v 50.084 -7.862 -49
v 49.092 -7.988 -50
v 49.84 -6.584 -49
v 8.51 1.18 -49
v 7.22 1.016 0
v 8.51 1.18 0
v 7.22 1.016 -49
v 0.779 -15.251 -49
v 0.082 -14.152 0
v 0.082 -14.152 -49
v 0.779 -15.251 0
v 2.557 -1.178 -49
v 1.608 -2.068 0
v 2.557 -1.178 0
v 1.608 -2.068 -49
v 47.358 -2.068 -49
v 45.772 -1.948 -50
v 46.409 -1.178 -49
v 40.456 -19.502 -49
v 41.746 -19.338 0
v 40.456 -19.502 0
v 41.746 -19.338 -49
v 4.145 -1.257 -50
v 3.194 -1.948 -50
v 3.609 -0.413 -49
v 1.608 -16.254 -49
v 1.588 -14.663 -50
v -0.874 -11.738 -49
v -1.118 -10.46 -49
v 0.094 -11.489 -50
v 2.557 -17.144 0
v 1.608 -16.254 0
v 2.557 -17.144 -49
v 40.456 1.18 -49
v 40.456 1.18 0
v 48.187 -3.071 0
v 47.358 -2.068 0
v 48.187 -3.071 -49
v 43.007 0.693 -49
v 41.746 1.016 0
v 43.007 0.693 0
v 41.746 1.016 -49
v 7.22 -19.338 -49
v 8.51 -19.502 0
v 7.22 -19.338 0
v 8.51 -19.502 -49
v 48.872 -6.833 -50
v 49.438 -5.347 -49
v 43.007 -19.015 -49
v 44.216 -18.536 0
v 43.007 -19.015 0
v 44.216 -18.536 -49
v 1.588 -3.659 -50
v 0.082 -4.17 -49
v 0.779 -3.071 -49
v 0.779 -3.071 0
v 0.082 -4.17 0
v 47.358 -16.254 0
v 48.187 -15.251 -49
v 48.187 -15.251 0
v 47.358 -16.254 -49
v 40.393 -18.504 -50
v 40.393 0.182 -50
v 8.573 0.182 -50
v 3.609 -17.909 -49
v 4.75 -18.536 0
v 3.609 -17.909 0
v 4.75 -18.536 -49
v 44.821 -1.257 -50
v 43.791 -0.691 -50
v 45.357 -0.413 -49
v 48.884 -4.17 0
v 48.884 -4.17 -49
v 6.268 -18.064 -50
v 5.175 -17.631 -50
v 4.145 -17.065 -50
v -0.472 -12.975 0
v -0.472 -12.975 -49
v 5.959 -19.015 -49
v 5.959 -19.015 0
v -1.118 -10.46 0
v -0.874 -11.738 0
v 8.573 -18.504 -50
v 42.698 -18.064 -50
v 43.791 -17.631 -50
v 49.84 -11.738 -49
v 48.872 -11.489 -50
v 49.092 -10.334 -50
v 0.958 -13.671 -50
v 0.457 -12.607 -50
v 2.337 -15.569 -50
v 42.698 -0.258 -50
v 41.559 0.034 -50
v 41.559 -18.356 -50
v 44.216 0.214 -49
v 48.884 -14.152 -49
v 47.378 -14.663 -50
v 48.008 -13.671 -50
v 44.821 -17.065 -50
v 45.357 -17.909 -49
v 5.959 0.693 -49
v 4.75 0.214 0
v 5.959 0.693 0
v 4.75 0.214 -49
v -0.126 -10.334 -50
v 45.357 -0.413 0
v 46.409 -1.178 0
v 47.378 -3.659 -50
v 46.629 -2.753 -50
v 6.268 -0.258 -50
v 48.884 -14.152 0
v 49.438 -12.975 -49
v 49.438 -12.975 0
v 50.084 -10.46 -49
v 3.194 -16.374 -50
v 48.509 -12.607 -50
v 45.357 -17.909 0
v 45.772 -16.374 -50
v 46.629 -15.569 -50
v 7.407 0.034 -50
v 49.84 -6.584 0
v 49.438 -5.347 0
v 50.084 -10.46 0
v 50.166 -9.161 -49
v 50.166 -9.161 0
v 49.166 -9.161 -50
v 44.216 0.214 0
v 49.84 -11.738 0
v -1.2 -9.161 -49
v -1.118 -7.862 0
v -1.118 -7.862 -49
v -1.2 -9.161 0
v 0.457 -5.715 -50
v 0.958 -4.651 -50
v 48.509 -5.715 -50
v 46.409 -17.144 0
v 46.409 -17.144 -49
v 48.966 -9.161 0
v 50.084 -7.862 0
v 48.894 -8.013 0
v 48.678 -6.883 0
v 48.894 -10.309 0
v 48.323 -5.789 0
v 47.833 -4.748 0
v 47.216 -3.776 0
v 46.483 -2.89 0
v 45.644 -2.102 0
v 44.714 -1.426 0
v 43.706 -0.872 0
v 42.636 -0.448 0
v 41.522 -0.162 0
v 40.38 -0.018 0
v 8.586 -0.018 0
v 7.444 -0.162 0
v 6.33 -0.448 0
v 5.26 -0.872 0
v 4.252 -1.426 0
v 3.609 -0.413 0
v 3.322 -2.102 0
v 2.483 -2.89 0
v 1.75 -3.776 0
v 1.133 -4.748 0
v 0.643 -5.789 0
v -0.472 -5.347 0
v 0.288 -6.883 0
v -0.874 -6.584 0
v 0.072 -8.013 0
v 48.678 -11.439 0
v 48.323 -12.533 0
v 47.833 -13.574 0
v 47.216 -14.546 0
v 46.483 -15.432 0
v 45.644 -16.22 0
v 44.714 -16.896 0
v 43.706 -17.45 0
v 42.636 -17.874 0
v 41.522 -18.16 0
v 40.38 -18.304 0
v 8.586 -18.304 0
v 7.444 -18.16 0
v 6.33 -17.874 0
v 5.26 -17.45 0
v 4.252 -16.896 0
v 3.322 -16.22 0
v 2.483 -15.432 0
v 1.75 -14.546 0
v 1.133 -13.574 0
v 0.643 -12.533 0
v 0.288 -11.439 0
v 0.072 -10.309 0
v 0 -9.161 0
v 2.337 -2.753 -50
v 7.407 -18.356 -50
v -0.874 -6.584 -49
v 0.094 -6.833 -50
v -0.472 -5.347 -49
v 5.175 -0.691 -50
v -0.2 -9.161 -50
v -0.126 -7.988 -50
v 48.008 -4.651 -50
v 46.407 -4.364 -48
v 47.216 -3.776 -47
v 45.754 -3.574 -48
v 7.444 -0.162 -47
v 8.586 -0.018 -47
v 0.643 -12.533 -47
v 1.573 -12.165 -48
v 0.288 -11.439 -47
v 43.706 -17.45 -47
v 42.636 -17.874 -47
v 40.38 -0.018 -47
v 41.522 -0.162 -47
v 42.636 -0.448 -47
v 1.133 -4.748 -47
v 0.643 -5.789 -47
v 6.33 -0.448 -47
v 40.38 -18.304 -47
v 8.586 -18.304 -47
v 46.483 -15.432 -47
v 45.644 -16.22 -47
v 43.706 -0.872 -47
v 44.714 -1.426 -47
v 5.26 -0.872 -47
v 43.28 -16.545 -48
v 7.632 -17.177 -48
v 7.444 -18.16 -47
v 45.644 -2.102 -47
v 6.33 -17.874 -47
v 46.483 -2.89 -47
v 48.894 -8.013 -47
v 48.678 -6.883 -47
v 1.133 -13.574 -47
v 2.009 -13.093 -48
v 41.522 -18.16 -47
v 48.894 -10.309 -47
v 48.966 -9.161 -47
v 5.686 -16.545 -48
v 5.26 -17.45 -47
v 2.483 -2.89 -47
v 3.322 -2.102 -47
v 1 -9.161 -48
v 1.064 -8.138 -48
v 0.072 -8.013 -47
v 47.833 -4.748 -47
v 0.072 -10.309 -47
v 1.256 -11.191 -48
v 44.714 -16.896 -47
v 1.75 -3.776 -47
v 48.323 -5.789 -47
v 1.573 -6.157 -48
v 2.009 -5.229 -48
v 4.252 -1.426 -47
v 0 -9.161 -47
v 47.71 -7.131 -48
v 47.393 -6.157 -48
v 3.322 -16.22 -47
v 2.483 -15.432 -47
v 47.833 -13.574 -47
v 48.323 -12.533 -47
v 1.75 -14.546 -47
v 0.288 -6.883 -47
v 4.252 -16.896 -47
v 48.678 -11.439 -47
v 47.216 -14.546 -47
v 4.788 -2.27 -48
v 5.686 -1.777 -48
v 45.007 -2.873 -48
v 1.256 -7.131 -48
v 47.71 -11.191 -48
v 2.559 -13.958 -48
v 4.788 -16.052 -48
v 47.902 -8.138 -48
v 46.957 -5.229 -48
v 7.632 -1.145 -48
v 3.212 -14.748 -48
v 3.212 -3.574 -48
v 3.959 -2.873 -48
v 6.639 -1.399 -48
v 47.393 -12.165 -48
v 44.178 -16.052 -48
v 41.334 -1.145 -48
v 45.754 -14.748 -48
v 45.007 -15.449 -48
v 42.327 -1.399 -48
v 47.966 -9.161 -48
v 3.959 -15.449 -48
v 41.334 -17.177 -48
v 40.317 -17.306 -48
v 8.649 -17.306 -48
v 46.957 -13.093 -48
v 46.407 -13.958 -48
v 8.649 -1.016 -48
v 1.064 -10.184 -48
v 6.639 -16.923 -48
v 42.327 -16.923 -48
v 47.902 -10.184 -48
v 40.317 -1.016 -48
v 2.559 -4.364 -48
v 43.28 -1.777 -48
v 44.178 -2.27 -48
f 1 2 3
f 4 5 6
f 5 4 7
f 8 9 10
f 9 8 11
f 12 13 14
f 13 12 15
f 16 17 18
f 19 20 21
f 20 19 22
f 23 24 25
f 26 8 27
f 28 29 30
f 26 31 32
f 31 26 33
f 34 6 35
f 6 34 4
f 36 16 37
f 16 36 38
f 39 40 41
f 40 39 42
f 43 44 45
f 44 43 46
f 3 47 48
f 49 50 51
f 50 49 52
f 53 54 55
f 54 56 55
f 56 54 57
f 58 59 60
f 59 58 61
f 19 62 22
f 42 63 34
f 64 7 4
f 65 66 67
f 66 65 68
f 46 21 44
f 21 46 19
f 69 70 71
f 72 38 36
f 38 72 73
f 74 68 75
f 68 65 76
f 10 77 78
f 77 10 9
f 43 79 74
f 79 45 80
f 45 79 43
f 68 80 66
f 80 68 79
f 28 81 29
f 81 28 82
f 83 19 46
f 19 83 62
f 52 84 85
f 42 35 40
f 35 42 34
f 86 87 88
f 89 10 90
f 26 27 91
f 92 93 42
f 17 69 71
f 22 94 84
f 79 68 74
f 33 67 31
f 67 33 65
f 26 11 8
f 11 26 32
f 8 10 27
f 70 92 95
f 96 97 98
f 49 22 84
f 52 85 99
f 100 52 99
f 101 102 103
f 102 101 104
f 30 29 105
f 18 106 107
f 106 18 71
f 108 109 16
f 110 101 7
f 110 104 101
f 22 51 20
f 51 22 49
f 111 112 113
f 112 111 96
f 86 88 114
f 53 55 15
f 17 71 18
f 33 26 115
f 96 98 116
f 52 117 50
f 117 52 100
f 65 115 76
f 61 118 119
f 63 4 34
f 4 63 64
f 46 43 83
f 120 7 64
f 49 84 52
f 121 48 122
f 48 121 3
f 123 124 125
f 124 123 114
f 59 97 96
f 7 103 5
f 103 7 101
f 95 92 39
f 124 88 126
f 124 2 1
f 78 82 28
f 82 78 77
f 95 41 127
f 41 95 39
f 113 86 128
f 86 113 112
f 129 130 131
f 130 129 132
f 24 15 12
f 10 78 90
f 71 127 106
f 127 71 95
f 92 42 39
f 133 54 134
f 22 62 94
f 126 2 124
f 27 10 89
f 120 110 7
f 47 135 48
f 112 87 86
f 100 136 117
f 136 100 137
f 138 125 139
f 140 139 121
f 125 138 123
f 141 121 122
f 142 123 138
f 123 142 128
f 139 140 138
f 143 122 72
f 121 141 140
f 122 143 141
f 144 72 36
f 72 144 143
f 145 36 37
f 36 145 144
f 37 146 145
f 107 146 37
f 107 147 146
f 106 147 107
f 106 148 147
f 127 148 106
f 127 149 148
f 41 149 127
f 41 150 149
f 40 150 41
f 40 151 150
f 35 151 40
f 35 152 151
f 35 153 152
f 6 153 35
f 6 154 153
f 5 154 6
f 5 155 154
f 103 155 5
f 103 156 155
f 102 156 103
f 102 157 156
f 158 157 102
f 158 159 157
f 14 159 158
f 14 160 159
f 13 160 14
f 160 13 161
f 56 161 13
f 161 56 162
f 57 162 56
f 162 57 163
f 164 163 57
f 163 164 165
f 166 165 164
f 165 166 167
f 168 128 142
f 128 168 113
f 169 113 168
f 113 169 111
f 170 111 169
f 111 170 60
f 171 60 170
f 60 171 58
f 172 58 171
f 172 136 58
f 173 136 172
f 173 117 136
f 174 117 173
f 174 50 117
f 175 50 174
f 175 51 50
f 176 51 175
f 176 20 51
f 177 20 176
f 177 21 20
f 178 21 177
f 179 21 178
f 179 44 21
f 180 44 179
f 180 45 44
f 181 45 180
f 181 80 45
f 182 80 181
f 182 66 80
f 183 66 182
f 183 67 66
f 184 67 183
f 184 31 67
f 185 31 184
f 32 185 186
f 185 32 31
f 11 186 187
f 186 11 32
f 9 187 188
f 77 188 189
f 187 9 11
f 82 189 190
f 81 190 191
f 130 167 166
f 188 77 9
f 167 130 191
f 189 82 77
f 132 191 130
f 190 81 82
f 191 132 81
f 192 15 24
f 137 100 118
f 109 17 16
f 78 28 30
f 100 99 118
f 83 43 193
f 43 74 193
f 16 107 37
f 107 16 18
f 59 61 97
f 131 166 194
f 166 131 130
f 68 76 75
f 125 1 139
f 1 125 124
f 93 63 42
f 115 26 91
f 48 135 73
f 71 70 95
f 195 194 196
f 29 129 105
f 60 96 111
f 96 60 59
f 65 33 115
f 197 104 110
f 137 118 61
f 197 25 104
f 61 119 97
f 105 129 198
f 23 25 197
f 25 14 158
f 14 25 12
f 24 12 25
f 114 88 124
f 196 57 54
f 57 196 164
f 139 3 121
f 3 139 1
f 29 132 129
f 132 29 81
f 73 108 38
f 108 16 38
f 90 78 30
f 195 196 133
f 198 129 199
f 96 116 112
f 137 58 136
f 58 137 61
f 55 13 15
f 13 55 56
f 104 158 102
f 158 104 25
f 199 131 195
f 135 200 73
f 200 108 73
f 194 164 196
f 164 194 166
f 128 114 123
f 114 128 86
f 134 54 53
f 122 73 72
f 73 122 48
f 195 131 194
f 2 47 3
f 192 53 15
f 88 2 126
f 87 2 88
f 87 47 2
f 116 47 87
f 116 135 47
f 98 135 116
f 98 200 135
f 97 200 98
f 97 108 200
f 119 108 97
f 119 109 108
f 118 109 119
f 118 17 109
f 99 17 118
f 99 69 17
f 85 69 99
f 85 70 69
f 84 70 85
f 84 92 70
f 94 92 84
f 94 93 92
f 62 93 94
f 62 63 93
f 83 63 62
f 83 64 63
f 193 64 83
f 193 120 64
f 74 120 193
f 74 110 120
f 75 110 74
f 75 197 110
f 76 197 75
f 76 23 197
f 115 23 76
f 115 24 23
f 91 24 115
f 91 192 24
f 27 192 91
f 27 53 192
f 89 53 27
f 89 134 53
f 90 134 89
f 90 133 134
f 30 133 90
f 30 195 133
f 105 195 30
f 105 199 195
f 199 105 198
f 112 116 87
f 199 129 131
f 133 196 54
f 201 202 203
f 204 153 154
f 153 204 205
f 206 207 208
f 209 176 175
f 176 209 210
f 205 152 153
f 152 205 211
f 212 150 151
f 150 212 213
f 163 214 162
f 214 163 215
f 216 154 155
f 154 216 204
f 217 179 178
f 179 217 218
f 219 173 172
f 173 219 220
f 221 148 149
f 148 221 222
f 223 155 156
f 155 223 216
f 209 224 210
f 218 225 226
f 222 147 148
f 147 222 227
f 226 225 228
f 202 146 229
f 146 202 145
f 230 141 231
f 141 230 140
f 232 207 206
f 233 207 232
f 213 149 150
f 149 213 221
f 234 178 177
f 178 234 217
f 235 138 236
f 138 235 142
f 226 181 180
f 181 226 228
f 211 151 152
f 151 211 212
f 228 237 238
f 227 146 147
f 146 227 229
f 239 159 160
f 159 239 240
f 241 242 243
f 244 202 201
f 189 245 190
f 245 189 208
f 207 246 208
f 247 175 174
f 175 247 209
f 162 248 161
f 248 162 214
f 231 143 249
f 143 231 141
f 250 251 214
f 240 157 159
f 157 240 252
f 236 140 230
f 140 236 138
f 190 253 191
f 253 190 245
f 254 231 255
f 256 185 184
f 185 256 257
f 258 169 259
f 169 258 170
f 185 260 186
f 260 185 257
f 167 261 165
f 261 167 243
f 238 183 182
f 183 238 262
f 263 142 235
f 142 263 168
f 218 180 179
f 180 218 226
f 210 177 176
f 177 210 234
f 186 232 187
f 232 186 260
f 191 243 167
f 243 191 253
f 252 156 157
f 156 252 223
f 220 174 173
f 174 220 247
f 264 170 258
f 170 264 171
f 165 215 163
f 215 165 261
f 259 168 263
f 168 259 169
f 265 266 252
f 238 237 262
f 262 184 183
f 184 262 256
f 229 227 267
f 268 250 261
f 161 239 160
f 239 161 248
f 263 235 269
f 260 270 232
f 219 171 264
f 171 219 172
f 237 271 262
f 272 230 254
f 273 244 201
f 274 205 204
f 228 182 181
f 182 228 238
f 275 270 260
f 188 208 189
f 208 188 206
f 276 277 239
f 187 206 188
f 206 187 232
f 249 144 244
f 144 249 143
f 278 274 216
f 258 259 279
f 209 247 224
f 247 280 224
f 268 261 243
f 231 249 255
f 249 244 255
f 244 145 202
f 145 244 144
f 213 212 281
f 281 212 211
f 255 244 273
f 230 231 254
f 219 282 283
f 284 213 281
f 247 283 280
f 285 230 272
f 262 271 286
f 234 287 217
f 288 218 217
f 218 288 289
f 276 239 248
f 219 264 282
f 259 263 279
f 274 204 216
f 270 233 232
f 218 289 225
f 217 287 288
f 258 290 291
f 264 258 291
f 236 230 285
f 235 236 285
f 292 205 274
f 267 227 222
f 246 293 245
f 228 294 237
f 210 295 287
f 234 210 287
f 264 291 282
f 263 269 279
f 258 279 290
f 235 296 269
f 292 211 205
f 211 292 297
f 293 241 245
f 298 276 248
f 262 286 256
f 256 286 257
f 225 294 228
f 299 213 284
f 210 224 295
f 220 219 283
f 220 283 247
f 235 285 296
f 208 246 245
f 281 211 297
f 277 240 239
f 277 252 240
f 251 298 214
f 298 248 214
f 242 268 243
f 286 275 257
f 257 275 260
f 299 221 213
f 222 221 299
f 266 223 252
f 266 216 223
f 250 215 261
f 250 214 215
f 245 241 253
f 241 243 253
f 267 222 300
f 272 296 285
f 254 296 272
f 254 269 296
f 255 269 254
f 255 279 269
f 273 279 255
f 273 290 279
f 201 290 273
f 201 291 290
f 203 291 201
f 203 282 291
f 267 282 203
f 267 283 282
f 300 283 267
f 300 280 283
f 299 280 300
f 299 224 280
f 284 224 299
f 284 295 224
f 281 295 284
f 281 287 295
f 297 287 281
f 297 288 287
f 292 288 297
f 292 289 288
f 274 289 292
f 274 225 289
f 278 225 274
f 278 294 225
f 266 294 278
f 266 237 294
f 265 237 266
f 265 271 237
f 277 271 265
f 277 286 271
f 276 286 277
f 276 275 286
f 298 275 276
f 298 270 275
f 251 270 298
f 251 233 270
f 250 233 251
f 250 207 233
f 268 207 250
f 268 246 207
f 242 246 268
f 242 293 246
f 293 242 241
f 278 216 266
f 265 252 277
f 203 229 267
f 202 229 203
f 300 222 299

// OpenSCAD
//Basic definition:
//Higher number = more faces = smoother model = slower processing.
$fn=50; 

//Case definition: 6.5x55 Swedish Mauser
//Base diameter of casing/rim 
d0=12.2; 

//Case scaling to allow oversized/fired cases
casescaling=1.01; 

//Block definition:
//Total number of cases you want
noOfCases=3;
//No of rows in the Y direction.
Rows=1;  
//Thickness of material outside hole
rim=3;  


//Total height of the lid.
height=50; 
//Lid thickness
lidthickness=2;
//Wall hickness
wallthickness=1.2;   
//Chamfer distance of the outside edge 0=no chamfer.
outerchamfer=1;

module corner(xpos,ypos,height,cornerradius,outerchamfer){
    translate([xpos,ypos,0])
    difference(){
      cylinder(h=height,r=cornerradius);
      translate([0,0,height])
         rotate_extrude(convexity=10)
             translate([cornerradius,0,0])
                circle(outerchamfer,$fn=4);  
    }   
}

function offset(rows)=(rows>1)?0:xoffset/2;

casesperrow=noOfCases/Rows; //No of cases in X direction. 

holediameter=d0*casescaling;
xoffset=holediameter+rim;
yoffset=xoffset*0.866;//Sqrt(3)/2=cos(30deg)
cornerradius=holediameter/2+rim;

x=xoffset*(casesperrow-0.5)+holediameter+2*rim-2*cornerradius;
y=yoffset*(Rows-1)+holediameter+2*rim-2*cornerradius;
rotate([180,0,0])
difference(){
    hull()
    translate([cornerradius,cornerradius,0]){
        corner(0,0,height,cornerradius+wallthickness,outerchamfer);
        corner(0,y,height,cornerradius+wallthickness,outerchamfer);
        corner(x-offset(Rows),0,height,cornerradius+wallthickness,outerchamfer);
        corner(x-offset(Rows),y,height,cornerradius+wallthickness,outerchamfer);
    }
    hull()
    translate([cornerradius,cornerradius,-lidthickness]){
        corner(0,0,height,cornerradius,outerchamfer);
        corner(0,y,height,cornerradius,outerchamfer);
        corner(x-offset(Rows),0,height,cornerradius,outerchamfer);
        corner(x-offset(Rows),y,height,cornerradius,outerchamfer);
    }
 
}
